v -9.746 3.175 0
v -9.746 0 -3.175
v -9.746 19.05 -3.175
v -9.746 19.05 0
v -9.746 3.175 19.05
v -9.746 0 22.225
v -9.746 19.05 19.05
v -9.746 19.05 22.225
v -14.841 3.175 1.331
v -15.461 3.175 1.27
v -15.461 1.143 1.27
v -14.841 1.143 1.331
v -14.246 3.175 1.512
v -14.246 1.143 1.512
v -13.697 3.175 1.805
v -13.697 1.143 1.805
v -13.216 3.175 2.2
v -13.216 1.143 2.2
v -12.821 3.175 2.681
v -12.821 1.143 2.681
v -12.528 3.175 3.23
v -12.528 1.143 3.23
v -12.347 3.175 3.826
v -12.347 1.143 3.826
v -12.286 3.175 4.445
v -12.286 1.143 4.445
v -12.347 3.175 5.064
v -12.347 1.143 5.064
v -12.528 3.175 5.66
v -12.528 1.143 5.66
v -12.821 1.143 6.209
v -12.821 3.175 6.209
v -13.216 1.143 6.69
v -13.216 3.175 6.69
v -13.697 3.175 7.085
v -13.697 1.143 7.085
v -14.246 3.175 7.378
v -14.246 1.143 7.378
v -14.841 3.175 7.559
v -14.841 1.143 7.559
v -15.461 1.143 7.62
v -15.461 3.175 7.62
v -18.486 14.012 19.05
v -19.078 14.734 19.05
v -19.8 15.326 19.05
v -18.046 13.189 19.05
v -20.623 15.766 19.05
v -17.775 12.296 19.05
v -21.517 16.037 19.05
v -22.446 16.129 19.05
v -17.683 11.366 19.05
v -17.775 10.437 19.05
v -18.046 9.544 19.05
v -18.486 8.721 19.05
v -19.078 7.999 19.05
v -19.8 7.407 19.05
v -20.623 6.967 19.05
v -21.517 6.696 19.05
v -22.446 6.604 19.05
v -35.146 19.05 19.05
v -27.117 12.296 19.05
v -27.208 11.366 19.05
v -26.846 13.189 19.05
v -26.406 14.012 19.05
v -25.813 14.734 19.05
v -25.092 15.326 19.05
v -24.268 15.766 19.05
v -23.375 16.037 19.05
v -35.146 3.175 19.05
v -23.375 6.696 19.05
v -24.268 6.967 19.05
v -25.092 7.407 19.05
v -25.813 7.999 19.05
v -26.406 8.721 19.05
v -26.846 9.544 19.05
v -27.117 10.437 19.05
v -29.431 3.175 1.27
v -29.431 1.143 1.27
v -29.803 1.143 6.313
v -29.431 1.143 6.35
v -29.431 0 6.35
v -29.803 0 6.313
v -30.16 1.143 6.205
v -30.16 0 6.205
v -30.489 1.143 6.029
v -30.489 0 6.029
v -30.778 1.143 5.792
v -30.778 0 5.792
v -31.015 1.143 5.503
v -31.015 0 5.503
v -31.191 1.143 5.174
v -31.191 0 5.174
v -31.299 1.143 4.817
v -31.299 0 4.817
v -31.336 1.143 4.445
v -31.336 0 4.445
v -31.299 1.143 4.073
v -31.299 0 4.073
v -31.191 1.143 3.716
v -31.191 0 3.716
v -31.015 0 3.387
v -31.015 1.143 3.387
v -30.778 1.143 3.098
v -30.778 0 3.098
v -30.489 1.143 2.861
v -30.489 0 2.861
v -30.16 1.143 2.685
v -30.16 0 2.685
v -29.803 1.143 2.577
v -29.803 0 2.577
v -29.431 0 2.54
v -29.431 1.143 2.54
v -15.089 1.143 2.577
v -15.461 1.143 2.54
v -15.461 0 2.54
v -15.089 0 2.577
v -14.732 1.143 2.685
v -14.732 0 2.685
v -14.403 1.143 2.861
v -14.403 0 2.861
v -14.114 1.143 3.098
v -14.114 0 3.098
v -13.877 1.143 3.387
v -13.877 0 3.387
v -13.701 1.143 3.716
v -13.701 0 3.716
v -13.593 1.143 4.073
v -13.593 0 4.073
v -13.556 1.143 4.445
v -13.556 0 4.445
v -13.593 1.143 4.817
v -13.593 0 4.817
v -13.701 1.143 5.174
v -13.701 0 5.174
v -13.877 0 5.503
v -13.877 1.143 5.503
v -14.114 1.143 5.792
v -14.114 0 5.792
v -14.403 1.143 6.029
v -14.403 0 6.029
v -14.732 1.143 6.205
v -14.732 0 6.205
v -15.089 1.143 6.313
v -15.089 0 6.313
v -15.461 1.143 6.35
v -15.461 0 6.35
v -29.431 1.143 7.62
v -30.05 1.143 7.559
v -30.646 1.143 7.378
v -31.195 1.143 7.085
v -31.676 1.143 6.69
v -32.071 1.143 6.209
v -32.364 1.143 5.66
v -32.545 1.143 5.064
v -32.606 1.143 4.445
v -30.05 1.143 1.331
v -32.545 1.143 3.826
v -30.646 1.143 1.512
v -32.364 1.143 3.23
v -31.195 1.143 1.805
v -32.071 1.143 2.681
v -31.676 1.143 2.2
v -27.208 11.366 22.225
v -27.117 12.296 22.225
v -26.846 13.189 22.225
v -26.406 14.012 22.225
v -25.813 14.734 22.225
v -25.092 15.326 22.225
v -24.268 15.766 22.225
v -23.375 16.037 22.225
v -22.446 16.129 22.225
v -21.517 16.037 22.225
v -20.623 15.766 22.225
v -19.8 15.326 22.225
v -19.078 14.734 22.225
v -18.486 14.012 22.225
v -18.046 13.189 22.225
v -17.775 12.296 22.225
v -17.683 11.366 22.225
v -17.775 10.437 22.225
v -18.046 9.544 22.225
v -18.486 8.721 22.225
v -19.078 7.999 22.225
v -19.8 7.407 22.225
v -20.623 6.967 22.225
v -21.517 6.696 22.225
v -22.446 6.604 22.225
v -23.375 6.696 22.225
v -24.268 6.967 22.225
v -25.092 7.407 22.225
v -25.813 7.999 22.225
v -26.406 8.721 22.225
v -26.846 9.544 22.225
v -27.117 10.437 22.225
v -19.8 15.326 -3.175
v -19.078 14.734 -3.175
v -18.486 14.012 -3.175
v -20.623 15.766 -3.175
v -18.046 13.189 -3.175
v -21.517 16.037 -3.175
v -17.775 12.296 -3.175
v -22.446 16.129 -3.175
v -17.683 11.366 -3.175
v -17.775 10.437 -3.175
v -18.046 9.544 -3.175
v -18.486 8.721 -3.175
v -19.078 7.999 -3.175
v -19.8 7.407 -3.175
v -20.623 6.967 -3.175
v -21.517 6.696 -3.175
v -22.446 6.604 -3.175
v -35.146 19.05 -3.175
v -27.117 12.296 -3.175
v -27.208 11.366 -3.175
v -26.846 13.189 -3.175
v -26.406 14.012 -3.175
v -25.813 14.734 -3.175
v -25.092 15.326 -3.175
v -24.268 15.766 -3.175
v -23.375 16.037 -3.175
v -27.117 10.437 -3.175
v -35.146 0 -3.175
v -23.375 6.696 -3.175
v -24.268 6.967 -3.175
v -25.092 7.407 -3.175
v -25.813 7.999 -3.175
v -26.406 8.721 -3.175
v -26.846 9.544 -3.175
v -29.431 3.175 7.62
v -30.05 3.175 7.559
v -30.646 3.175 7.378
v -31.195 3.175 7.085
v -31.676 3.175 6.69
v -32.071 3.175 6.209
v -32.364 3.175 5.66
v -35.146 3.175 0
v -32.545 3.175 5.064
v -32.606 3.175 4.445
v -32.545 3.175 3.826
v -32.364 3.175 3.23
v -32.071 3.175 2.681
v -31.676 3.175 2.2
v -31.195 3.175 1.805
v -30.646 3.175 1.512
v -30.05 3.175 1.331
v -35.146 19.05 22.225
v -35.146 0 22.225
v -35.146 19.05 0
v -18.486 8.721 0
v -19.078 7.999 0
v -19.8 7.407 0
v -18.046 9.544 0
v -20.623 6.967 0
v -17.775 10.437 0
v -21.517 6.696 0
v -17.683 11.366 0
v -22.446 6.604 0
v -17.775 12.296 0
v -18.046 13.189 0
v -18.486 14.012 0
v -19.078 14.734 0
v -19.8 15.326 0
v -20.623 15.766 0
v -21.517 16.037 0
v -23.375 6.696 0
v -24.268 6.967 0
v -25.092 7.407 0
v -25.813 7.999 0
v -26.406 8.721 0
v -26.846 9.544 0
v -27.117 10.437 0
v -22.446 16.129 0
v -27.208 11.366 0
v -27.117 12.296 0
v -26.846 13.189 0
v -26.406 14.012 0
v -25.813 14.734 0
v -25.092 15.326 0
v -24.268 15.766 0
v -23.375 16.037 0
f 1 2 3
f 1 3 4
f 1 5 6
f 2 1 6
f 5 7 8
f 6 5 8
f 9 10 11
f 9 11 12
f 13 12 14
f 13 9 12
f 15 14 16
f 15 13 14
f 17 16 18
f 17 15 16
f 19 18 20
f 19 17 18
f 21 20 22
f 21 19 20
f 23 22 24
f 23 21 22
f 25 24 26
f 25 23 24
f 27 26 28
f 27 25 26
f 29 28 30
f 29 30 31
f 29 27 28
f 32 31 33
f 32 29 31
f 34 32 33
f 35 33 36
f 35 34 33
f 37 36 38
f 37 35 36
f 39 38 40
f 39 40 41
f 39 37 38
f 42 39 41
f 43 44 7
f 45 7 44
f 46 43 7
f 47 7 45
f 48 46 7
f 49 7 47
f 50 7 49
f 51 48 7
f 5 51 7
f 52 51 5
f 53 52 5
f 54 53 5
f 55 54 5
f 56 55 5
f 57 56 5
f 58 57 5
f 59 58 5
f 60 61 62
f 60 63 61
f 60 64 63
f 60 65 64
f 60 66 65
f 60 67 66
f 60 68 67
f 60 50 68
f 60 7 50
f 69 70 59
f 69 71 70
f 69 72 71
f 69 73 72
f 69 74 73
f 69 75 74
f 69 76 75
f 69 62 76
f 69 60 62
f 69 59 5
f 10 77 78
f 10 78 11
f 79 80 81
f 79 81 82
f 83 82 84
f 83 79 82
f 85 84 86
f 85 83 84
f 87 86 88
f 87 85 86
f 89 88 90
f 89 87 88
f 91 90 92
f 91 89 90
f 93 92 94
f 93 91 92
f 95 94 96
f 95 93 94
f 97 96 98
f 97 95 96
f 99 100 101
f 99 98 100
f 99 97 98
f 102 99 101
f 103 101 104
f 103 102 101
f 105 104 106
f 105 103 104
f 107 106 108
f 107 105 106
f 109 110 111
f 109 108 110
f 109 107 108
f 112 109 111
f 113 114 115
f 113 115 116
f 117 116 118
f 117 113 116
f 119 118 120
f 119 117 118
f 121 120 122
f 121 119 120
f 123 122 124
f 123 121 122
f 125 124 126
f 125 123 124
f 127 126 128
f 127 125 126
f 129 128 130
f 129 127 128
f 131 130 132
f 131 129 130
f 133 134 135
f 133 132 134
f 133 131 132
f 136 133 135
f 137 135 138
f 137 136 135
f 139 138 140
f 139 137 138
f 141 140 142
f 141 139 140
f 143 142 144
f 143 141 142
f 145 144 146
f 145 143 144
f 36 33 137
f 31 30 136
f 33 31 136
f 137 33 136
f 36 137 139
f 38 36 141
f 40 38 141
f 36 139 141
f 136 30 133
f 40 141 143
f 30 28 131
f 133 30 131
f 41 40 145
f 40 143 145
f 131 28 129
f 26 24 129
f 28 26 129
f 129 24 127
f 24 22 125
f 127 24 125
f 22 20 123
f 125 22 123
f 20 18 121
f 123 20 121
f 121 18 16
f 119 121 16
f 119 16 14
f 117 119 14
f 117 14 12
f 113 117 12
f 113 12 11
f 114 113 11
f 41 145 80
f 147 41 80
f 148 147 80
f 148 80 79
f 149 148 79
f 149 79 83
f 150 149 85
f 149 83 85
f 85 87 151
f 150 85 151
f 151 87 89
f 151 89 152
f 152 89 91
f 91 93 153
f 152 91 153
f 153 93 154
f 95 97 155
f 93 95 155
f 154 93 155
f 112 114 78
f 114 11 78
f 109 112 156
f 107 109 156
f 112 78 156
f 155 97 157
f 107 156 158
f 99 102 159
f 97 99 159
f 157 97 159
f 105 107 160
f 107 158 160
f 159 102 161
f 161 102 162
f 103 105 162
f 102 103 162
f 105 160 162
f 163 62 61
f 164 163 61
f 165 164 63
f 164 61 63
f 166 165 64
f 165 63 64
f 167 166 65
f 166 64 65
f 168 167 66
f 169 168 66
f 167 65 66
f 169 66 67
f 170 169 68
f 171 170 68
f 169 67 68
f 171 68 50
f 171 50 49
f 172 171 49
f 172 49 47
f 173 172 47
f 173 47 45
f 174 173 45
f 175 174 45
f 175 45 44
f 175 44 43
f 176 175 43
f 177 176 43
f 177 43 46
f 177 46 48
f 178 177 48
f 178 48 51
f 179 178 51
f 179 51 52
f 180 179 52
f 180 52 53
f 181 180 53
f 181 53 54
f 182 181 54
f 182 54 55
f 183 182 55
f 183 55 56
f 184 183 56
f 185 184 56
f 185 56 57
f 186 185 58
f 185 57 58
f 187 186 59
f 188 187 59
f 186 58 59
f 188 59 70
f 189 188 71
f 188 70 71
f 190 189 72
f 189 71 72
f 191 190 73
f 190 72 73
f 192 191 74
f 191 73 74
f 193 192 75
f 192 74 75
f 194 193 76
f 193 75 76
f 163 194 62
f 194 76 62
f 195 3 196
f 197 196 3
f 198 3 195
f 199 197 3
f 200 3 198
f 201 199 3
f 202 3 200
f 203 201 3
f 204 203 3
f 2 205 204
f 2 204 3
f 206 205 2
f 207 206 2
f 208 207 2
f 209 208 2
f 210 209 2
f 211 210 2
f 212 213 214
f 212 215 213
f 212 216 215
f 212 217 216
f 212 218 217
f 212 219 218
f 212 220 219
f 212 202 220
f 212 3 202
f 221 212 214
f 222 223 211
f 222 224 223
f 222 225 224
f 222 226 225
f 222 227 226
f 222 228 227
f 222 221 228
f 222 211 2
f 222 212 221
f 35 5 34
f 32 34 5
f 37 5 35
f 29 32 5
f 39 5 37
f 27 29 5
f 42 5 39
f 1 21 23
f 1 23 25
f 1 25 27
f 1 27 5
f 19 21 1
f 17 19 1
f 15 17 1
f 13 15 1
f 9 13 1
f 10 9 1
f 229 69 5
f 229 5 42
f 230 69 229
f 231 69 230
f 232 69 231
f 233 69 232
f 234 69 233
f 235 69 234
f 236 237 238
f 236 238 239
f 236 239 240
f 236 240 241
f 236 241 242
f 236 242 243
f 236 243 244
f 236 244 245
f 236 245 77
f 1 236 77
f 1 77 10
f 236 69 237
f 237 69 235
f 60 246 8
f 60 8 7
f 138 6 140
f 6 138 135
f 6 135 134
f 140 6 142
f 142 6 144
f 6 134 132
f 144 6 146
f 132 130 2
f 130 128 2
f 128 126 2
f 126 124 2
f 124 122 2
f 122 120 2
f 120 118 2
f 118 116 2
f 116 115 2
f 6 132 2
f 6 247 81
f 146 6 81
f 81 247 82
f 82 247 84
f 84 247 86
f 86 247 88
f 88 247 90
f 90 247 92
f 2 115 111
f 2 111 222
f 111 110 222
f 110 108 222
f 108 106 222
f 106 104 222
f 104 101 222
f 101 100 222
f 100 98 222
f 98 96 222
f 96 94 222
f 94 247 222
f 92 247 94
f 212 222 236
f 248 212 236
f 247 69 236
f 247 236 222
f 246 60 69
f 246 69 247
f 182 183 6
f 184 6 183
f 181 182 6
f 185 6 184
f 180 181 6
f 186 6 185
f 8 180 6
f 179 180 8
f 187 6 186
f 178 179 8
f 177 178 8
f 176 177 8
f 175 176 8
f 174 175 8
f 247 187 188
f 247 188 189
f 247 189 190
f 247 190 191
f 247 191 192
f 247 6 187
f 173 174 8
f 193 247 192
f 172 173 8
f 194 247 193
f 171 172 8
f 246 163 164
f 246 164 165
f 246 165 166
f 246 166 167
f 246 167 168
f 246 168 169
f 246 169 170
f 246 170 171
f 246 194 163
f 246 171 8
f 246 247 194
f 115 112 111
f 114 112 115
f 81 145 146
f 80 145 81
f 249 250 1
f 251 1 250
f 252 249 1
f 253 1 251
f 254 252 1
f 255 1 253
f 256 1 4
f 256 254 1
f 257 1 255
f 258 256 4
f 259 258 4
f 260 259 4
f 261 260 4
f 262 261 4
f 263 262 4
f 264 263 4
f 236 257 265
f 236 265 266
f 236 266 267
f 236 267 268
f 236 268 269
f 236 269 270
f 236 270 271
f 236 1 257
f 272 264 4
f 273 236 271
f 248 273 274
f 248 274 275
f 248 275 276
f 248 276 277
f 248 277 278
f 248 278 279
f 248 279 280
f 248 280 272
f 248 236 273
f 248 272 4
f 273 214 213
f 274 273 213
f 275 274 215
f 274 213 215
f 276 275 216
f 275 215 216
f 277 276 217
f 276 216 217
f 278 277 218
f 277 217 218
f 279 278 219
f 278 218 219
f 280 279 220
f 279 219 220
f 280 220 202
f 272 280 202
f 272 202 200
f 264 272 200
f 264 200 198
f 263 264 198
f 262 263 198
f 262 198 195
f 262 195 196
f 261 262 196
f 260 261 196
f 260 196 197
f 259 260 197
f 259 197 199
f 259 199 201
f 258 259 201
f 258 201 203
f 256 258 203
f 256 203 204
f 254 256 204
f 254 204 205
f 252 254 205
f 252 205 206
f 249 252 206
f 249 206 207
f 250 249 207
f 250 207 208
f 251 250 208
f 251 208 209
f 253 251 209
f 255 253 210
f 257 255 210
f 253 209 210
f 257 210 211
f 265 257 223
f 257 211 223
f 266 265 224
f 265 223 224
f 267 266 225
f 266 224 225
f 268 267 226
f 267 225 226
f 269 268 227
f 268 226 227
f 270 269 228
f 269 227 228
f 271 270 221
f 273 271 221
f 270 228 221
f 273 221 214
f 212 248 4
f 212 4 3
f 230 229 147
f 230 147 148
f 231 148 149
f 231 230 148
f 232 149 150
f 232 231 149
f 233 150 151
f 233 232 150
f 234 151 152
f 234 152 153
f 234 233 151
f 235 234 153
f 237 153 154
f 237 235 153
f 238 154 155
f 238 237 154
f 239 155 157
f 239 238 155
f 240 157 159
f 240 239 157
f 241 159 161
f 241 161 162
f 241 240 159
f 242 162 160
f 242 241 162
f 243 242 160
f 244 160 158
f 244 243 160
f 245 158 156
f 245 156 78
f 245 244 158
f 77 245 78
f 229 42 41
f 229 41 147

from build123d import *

# Parameters (mm, degrees)
BOSS_EXTRUDE2_DEPTH = 25.4
SKETCH3_R           = 4.7625
CUT_EXTRUDE1_DEPTH  = 36.576
CUT_EXTRUDE2_DEPTH  = 66.04
CUT_EXTRUDE3_DEPTH  = 2.032


with BuildPart() as part:
    # Sketch1 → Boss-Extrude2 (new body)
    with BuildSketch(Plane(origin=(-35.145897579, 0, 0), x_dir=(0, 0, -1), z_dir=(1, 0, 0))):
        Polygon((0, 0), (-19.05, 0), (-22.225, 0), (-22.225, 19.05), (-19.05, 19.05), (-19.05, 3.175), (0, 3.175), (0, 19.05), (3.175, 19.05), (3.175, 0), align=None)
    extrude(amount=BOSS_EXTRUDE2_DEPTH)

    # Sketch3 → Cut-Extrude1 (cut)
    with BuildSketch(Plane(origin=(0, 0, -3.175), x_dir=(-1, 0, 0), z_dir=(0, 0, -1))):
        with Locations((22.445897579, 11.3665)):
            Circle(SKETCH3_R)
    extrude(amount=-CUT_EXTRUDE1_DEPTH, mode=Mode.SUBTRACT)

    # Sketch4 → Cut-Extrude2 (cut)
    with BuildSketch(Plane(origin=(0, 3.175, 0), x_dir=(1, 0, 0), z_dir=(0, 1, 0))):
        with BuildLine():
            Line((-29.430897579, -2.54), (-15.460897579, -2.54))
            ThreePointArc((-15.460897579, -2.54), (-13.555897579, -4.445), (-15.460897579, -6.35))
            Line((-15.460897579, -6.35), (-29.430897579, -6.35))
            ThreePointArc((-29.430897579, -6.35), (-31.335897579, -4.445), (-29.430897579, -2.54))
        make_face()
    extrude(amount=-CUT_EXTRUDE2_DEPTH, mode=Mode.SUBTRACT)

    # Sketch7 → Cut-Extrude3 (cut)
    with BuildSketch(Plane(origin=(0, 3.175, 0), x_dir=(1, 0, 0), z_dir=(0, 1, 0))):
        with BuildLine():
            Line((-29.430897579, -1.27), (-15.460897579, -1.27))
            ThreePointArc((-15.460897579, -1.27), (-12.285897579, -4.445), (-15.460897579, -7.62))
            Line((-15.460897579, -7.62), (-29.430897579, -7.62))
            ThreePointArc((-29.430897579, -7.62), (-32.605897579, -4.445), (-29.430897579, -1.27))
        make_face()
    extrude(amount=-CUT_EXTRUDE3_DEPTH, mode=Mode.SUBTRACT)


solid = part.part
